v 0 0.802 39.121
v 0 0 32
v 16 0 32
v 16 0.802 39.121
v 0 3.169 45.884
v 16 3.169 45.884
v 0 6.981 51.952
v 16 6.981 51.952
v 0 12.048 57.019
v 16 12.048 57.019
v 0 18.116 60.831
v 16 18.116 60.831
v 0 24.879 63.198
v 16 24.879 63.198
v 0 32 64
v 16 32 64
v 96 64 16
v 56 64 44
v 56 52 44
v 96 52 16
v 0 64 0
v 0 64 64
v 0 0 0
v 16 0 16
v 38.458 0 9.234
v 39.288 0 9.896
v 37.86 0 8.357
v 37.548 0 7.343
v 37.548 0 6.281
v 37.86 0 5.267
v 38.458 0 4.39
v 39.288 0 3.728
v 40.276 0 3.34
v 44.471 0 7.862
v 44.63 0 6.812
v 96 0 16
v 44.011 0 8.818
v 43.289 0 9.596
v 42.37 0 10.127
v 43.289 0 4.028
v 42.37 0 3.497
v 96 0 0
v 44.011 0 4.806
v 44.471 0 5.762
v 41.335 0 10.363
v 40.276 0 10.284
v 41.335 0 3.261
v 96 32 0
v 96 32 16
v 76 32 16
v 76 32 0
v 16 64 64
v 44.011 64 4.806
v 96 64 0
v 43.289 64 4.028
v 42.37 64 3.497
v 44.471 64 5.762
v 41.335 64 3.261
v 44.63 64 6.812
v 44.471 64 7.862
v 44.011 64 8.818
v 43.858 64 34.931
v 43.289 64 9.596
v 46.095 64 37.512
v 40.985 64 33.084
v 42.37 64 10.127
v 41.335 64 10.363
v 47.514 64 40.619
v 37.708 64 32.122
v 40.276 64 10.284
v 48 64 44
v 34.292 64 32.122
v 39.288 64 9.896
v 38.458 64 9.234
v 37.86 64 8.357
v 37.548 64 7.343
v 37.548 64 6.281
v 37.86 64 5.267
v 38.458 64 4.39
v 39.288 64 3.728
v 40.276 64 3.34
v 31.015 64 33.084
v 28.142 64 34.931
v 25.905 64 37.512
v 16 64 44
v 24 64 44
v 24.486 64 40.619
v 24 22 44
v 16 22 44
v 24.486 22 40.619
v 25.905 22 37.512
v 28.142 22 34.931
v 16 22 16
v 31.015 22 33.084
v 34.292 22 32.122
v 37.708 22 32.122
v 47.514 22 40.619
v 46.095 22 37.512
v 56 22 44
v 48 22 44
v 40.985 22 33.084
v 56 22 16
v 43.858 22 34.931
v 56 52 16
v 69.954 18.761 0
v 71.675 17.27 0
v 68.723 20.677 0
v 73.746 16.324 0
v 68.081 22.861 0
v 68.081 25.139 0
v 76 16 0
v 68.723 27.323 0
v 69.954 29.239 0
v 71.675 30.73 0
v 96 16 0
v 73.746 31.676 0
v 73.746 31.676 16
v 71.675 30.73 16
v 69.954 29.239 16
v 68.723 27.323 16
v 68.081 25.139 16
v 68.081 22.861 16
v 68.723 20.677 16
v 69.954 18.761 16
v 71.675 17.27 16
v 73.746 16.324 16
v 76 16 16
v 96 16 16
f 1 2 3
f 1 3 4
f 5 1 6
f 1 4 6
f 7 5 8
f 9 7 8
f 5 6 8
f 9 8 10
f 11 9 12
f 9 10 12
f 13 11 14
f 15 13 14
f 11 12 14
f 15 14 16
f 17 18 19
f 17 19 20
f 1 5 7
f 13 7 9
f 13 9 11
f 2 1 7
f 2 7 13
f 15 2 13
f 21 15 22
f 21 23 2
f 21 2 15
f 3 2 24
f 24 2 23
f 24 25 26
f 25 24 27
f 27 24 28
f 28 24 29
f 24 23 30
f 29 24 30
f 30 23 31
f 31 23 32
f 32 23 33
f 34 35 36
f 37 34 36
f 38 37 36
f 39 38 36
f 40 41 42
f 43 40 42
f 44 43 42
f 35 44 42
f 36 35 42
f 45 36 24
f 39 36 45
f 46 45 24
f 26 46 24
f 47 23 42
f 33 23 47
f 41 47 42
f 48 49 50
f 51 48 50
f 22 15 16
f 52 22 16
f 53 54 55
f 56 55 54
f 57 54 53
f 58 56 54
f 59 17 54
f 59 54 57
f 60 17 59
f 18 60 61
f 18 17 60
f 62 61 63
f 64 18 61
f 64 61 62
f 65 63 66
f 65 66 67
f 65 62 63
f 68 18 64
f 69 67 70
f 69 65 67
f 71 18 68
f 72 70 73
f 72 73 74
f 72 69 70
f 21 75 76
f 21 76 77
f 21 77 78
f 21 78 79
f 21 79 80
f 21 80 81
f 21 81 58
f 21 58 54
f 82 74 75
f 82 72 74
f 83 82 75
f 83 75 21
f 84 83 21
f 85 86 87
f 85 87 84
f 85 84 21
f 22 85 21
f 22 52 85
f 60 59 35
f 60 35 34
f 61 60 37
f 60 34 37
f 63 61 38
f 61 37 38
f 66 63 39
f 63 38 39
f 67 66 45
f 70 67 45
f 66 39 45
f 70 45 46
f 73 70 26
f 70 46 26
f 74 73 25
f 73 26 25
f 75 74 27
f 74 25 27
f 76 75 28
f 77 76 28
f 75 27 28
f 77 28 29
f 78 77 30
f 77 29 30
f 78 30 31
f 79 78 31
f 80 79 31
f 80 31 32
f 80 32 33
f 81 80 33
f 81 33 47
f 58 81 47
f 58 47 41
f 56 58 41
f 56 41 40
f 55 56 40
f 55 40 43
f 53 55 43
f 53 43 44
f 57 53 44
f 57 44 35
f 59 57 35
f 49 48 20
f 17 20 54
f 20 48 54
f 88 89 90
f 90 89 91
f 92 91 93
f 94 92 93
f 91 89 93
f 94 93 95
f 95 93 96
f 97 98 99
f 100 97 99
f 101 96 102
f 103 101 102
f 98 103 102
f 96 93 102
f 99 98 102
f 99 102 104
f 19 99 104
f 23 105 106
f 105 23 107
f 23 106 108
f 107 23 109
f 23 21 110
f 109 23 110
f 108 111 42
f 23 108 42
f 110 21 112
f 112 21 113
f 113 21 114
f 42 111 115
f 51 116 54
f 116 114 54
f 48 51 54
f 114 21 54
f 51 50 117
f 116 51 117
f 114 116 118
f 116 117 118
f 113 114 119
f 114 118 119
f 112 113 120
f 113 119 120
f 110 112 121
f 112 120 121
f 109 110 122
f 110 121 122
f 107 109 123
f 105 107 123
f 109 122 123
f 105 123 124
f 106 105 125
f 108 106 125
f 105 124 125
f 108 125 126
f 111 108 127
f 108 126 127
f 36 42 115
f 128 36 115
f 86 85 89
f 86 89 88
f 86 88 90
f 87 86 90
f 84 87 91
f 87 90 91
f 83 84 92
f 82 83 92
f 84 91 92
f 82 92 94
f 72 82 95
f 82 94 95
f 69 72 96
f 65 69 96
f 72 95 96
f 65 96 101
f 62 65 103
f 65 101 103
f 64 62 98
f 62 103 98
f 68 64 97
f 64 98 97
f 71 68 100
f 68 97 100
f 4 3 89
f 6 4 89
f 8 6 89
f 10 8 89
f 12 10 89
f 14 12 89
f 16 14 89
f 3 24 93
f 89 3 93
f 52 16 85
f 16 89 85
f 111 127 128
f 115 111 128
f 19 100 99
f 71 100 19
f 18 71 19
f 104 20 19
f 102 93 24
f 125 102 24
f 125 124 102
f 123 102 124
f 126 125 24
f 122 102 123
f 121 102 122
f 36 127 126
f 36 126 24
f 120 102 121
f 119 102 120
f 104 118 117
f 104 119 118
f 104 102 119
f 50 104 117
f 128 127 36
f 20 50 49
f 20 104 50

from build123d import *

# Parameters (mm, degrees)
F0_W      = 96
F0_H      = 64
F1_DEPTH  = 16
F3_DEPTH  = 16.001
F4_W      = 16
F4_H      = 64
F5_DEPTH  = 48
F6_R      = 32
F7_W      = 40
F7_H      = 42
F8_DEPTH  = 28
F10_DEPTH = 42.001
F12_DEPTH = 12
F13_R     = 3.560892
F14_DEPTH = 64.001


with BuildPart() as f1:
    # F0 (on Top) → F1 (new body)
    with BuildSketch(Plane.XY):
        with Locations((48, 32)):
            Rectangle(F0_W, F0_H)
    extrude(amount=F1_DEPTH)

    # F2 (on face) → F3 (cut, through all)
    with BuildSketch(Plane.XY.offset(16)):
        with BuildLine():
            ThreePointArc((76, 32), (68, 24), (76, 16))
            Line((76, 16), (96, 16))
            Line((96, 16), (96, 32))
            Line((96, 32), (76, 32))
        make_face()
    extrude(amount=-F3_DEPTH, mode=Mode.SUBTRACT)

    # F4 (on face) → F5 (join)
    with BuildSketch(Plane.XY.offset(16)):
        with Locations((8, 32)):
            Rectangle(F4_W, F4_H)
    extrude(amount=F5_DEPTH)

    # F6
    f6_edges = [f1.edges().sort_by_distance(p)[0] for p in [
        (8, 0, 64),
    ]]
    fillet(f6_edges, radius=F6_R)

    # F7 (on face) → F8 (join)
    with BuildSketch(Plane.XY.offset(16)):
        with Locations((36, 43)):
            Rectangle(F7_W, F7_H)
    extrude(amount=F8_DEPTH)

    # F9 (on face) → F10 (cut, through all)
    with BuildSketch(Plane.XZ.offset(-22)):
        with BuildLine():
            ThreePointArc((24, 44), (36, 32), (48, 44))
            Line((48, 44), (24, 44))
        make_face()
        with BuildLine():
            Line((24, 44), (48, 44))
            ThreePointArc((48, 44), (36, 56), (24, 44))
        make_face()
    extrude(amount=-F10_DEPTH, mode=Mode.SUBTRACT)

    # F11 (on face) → F12 (join)
    with BuildSketch(Plane(origin=(0, 64, 0), x_dir=(-1, 0, 0), z_dir=(0, 1, 0))):
        Polygon((-56, 16), (-56, 44), (-96, 16), align=None)
    extrude(amount=-F12_DEPTH)

    # F13 (on face) → F14 (cut, through all)
    with BuildSketch(Plane.XZ):
        with Locations((41.068658, 6.811937)):
            Circle(F13_R)
    extrude(amount=-F14_DEPTH, mode=Mode.SUBTRACT)


solid = f1.part
